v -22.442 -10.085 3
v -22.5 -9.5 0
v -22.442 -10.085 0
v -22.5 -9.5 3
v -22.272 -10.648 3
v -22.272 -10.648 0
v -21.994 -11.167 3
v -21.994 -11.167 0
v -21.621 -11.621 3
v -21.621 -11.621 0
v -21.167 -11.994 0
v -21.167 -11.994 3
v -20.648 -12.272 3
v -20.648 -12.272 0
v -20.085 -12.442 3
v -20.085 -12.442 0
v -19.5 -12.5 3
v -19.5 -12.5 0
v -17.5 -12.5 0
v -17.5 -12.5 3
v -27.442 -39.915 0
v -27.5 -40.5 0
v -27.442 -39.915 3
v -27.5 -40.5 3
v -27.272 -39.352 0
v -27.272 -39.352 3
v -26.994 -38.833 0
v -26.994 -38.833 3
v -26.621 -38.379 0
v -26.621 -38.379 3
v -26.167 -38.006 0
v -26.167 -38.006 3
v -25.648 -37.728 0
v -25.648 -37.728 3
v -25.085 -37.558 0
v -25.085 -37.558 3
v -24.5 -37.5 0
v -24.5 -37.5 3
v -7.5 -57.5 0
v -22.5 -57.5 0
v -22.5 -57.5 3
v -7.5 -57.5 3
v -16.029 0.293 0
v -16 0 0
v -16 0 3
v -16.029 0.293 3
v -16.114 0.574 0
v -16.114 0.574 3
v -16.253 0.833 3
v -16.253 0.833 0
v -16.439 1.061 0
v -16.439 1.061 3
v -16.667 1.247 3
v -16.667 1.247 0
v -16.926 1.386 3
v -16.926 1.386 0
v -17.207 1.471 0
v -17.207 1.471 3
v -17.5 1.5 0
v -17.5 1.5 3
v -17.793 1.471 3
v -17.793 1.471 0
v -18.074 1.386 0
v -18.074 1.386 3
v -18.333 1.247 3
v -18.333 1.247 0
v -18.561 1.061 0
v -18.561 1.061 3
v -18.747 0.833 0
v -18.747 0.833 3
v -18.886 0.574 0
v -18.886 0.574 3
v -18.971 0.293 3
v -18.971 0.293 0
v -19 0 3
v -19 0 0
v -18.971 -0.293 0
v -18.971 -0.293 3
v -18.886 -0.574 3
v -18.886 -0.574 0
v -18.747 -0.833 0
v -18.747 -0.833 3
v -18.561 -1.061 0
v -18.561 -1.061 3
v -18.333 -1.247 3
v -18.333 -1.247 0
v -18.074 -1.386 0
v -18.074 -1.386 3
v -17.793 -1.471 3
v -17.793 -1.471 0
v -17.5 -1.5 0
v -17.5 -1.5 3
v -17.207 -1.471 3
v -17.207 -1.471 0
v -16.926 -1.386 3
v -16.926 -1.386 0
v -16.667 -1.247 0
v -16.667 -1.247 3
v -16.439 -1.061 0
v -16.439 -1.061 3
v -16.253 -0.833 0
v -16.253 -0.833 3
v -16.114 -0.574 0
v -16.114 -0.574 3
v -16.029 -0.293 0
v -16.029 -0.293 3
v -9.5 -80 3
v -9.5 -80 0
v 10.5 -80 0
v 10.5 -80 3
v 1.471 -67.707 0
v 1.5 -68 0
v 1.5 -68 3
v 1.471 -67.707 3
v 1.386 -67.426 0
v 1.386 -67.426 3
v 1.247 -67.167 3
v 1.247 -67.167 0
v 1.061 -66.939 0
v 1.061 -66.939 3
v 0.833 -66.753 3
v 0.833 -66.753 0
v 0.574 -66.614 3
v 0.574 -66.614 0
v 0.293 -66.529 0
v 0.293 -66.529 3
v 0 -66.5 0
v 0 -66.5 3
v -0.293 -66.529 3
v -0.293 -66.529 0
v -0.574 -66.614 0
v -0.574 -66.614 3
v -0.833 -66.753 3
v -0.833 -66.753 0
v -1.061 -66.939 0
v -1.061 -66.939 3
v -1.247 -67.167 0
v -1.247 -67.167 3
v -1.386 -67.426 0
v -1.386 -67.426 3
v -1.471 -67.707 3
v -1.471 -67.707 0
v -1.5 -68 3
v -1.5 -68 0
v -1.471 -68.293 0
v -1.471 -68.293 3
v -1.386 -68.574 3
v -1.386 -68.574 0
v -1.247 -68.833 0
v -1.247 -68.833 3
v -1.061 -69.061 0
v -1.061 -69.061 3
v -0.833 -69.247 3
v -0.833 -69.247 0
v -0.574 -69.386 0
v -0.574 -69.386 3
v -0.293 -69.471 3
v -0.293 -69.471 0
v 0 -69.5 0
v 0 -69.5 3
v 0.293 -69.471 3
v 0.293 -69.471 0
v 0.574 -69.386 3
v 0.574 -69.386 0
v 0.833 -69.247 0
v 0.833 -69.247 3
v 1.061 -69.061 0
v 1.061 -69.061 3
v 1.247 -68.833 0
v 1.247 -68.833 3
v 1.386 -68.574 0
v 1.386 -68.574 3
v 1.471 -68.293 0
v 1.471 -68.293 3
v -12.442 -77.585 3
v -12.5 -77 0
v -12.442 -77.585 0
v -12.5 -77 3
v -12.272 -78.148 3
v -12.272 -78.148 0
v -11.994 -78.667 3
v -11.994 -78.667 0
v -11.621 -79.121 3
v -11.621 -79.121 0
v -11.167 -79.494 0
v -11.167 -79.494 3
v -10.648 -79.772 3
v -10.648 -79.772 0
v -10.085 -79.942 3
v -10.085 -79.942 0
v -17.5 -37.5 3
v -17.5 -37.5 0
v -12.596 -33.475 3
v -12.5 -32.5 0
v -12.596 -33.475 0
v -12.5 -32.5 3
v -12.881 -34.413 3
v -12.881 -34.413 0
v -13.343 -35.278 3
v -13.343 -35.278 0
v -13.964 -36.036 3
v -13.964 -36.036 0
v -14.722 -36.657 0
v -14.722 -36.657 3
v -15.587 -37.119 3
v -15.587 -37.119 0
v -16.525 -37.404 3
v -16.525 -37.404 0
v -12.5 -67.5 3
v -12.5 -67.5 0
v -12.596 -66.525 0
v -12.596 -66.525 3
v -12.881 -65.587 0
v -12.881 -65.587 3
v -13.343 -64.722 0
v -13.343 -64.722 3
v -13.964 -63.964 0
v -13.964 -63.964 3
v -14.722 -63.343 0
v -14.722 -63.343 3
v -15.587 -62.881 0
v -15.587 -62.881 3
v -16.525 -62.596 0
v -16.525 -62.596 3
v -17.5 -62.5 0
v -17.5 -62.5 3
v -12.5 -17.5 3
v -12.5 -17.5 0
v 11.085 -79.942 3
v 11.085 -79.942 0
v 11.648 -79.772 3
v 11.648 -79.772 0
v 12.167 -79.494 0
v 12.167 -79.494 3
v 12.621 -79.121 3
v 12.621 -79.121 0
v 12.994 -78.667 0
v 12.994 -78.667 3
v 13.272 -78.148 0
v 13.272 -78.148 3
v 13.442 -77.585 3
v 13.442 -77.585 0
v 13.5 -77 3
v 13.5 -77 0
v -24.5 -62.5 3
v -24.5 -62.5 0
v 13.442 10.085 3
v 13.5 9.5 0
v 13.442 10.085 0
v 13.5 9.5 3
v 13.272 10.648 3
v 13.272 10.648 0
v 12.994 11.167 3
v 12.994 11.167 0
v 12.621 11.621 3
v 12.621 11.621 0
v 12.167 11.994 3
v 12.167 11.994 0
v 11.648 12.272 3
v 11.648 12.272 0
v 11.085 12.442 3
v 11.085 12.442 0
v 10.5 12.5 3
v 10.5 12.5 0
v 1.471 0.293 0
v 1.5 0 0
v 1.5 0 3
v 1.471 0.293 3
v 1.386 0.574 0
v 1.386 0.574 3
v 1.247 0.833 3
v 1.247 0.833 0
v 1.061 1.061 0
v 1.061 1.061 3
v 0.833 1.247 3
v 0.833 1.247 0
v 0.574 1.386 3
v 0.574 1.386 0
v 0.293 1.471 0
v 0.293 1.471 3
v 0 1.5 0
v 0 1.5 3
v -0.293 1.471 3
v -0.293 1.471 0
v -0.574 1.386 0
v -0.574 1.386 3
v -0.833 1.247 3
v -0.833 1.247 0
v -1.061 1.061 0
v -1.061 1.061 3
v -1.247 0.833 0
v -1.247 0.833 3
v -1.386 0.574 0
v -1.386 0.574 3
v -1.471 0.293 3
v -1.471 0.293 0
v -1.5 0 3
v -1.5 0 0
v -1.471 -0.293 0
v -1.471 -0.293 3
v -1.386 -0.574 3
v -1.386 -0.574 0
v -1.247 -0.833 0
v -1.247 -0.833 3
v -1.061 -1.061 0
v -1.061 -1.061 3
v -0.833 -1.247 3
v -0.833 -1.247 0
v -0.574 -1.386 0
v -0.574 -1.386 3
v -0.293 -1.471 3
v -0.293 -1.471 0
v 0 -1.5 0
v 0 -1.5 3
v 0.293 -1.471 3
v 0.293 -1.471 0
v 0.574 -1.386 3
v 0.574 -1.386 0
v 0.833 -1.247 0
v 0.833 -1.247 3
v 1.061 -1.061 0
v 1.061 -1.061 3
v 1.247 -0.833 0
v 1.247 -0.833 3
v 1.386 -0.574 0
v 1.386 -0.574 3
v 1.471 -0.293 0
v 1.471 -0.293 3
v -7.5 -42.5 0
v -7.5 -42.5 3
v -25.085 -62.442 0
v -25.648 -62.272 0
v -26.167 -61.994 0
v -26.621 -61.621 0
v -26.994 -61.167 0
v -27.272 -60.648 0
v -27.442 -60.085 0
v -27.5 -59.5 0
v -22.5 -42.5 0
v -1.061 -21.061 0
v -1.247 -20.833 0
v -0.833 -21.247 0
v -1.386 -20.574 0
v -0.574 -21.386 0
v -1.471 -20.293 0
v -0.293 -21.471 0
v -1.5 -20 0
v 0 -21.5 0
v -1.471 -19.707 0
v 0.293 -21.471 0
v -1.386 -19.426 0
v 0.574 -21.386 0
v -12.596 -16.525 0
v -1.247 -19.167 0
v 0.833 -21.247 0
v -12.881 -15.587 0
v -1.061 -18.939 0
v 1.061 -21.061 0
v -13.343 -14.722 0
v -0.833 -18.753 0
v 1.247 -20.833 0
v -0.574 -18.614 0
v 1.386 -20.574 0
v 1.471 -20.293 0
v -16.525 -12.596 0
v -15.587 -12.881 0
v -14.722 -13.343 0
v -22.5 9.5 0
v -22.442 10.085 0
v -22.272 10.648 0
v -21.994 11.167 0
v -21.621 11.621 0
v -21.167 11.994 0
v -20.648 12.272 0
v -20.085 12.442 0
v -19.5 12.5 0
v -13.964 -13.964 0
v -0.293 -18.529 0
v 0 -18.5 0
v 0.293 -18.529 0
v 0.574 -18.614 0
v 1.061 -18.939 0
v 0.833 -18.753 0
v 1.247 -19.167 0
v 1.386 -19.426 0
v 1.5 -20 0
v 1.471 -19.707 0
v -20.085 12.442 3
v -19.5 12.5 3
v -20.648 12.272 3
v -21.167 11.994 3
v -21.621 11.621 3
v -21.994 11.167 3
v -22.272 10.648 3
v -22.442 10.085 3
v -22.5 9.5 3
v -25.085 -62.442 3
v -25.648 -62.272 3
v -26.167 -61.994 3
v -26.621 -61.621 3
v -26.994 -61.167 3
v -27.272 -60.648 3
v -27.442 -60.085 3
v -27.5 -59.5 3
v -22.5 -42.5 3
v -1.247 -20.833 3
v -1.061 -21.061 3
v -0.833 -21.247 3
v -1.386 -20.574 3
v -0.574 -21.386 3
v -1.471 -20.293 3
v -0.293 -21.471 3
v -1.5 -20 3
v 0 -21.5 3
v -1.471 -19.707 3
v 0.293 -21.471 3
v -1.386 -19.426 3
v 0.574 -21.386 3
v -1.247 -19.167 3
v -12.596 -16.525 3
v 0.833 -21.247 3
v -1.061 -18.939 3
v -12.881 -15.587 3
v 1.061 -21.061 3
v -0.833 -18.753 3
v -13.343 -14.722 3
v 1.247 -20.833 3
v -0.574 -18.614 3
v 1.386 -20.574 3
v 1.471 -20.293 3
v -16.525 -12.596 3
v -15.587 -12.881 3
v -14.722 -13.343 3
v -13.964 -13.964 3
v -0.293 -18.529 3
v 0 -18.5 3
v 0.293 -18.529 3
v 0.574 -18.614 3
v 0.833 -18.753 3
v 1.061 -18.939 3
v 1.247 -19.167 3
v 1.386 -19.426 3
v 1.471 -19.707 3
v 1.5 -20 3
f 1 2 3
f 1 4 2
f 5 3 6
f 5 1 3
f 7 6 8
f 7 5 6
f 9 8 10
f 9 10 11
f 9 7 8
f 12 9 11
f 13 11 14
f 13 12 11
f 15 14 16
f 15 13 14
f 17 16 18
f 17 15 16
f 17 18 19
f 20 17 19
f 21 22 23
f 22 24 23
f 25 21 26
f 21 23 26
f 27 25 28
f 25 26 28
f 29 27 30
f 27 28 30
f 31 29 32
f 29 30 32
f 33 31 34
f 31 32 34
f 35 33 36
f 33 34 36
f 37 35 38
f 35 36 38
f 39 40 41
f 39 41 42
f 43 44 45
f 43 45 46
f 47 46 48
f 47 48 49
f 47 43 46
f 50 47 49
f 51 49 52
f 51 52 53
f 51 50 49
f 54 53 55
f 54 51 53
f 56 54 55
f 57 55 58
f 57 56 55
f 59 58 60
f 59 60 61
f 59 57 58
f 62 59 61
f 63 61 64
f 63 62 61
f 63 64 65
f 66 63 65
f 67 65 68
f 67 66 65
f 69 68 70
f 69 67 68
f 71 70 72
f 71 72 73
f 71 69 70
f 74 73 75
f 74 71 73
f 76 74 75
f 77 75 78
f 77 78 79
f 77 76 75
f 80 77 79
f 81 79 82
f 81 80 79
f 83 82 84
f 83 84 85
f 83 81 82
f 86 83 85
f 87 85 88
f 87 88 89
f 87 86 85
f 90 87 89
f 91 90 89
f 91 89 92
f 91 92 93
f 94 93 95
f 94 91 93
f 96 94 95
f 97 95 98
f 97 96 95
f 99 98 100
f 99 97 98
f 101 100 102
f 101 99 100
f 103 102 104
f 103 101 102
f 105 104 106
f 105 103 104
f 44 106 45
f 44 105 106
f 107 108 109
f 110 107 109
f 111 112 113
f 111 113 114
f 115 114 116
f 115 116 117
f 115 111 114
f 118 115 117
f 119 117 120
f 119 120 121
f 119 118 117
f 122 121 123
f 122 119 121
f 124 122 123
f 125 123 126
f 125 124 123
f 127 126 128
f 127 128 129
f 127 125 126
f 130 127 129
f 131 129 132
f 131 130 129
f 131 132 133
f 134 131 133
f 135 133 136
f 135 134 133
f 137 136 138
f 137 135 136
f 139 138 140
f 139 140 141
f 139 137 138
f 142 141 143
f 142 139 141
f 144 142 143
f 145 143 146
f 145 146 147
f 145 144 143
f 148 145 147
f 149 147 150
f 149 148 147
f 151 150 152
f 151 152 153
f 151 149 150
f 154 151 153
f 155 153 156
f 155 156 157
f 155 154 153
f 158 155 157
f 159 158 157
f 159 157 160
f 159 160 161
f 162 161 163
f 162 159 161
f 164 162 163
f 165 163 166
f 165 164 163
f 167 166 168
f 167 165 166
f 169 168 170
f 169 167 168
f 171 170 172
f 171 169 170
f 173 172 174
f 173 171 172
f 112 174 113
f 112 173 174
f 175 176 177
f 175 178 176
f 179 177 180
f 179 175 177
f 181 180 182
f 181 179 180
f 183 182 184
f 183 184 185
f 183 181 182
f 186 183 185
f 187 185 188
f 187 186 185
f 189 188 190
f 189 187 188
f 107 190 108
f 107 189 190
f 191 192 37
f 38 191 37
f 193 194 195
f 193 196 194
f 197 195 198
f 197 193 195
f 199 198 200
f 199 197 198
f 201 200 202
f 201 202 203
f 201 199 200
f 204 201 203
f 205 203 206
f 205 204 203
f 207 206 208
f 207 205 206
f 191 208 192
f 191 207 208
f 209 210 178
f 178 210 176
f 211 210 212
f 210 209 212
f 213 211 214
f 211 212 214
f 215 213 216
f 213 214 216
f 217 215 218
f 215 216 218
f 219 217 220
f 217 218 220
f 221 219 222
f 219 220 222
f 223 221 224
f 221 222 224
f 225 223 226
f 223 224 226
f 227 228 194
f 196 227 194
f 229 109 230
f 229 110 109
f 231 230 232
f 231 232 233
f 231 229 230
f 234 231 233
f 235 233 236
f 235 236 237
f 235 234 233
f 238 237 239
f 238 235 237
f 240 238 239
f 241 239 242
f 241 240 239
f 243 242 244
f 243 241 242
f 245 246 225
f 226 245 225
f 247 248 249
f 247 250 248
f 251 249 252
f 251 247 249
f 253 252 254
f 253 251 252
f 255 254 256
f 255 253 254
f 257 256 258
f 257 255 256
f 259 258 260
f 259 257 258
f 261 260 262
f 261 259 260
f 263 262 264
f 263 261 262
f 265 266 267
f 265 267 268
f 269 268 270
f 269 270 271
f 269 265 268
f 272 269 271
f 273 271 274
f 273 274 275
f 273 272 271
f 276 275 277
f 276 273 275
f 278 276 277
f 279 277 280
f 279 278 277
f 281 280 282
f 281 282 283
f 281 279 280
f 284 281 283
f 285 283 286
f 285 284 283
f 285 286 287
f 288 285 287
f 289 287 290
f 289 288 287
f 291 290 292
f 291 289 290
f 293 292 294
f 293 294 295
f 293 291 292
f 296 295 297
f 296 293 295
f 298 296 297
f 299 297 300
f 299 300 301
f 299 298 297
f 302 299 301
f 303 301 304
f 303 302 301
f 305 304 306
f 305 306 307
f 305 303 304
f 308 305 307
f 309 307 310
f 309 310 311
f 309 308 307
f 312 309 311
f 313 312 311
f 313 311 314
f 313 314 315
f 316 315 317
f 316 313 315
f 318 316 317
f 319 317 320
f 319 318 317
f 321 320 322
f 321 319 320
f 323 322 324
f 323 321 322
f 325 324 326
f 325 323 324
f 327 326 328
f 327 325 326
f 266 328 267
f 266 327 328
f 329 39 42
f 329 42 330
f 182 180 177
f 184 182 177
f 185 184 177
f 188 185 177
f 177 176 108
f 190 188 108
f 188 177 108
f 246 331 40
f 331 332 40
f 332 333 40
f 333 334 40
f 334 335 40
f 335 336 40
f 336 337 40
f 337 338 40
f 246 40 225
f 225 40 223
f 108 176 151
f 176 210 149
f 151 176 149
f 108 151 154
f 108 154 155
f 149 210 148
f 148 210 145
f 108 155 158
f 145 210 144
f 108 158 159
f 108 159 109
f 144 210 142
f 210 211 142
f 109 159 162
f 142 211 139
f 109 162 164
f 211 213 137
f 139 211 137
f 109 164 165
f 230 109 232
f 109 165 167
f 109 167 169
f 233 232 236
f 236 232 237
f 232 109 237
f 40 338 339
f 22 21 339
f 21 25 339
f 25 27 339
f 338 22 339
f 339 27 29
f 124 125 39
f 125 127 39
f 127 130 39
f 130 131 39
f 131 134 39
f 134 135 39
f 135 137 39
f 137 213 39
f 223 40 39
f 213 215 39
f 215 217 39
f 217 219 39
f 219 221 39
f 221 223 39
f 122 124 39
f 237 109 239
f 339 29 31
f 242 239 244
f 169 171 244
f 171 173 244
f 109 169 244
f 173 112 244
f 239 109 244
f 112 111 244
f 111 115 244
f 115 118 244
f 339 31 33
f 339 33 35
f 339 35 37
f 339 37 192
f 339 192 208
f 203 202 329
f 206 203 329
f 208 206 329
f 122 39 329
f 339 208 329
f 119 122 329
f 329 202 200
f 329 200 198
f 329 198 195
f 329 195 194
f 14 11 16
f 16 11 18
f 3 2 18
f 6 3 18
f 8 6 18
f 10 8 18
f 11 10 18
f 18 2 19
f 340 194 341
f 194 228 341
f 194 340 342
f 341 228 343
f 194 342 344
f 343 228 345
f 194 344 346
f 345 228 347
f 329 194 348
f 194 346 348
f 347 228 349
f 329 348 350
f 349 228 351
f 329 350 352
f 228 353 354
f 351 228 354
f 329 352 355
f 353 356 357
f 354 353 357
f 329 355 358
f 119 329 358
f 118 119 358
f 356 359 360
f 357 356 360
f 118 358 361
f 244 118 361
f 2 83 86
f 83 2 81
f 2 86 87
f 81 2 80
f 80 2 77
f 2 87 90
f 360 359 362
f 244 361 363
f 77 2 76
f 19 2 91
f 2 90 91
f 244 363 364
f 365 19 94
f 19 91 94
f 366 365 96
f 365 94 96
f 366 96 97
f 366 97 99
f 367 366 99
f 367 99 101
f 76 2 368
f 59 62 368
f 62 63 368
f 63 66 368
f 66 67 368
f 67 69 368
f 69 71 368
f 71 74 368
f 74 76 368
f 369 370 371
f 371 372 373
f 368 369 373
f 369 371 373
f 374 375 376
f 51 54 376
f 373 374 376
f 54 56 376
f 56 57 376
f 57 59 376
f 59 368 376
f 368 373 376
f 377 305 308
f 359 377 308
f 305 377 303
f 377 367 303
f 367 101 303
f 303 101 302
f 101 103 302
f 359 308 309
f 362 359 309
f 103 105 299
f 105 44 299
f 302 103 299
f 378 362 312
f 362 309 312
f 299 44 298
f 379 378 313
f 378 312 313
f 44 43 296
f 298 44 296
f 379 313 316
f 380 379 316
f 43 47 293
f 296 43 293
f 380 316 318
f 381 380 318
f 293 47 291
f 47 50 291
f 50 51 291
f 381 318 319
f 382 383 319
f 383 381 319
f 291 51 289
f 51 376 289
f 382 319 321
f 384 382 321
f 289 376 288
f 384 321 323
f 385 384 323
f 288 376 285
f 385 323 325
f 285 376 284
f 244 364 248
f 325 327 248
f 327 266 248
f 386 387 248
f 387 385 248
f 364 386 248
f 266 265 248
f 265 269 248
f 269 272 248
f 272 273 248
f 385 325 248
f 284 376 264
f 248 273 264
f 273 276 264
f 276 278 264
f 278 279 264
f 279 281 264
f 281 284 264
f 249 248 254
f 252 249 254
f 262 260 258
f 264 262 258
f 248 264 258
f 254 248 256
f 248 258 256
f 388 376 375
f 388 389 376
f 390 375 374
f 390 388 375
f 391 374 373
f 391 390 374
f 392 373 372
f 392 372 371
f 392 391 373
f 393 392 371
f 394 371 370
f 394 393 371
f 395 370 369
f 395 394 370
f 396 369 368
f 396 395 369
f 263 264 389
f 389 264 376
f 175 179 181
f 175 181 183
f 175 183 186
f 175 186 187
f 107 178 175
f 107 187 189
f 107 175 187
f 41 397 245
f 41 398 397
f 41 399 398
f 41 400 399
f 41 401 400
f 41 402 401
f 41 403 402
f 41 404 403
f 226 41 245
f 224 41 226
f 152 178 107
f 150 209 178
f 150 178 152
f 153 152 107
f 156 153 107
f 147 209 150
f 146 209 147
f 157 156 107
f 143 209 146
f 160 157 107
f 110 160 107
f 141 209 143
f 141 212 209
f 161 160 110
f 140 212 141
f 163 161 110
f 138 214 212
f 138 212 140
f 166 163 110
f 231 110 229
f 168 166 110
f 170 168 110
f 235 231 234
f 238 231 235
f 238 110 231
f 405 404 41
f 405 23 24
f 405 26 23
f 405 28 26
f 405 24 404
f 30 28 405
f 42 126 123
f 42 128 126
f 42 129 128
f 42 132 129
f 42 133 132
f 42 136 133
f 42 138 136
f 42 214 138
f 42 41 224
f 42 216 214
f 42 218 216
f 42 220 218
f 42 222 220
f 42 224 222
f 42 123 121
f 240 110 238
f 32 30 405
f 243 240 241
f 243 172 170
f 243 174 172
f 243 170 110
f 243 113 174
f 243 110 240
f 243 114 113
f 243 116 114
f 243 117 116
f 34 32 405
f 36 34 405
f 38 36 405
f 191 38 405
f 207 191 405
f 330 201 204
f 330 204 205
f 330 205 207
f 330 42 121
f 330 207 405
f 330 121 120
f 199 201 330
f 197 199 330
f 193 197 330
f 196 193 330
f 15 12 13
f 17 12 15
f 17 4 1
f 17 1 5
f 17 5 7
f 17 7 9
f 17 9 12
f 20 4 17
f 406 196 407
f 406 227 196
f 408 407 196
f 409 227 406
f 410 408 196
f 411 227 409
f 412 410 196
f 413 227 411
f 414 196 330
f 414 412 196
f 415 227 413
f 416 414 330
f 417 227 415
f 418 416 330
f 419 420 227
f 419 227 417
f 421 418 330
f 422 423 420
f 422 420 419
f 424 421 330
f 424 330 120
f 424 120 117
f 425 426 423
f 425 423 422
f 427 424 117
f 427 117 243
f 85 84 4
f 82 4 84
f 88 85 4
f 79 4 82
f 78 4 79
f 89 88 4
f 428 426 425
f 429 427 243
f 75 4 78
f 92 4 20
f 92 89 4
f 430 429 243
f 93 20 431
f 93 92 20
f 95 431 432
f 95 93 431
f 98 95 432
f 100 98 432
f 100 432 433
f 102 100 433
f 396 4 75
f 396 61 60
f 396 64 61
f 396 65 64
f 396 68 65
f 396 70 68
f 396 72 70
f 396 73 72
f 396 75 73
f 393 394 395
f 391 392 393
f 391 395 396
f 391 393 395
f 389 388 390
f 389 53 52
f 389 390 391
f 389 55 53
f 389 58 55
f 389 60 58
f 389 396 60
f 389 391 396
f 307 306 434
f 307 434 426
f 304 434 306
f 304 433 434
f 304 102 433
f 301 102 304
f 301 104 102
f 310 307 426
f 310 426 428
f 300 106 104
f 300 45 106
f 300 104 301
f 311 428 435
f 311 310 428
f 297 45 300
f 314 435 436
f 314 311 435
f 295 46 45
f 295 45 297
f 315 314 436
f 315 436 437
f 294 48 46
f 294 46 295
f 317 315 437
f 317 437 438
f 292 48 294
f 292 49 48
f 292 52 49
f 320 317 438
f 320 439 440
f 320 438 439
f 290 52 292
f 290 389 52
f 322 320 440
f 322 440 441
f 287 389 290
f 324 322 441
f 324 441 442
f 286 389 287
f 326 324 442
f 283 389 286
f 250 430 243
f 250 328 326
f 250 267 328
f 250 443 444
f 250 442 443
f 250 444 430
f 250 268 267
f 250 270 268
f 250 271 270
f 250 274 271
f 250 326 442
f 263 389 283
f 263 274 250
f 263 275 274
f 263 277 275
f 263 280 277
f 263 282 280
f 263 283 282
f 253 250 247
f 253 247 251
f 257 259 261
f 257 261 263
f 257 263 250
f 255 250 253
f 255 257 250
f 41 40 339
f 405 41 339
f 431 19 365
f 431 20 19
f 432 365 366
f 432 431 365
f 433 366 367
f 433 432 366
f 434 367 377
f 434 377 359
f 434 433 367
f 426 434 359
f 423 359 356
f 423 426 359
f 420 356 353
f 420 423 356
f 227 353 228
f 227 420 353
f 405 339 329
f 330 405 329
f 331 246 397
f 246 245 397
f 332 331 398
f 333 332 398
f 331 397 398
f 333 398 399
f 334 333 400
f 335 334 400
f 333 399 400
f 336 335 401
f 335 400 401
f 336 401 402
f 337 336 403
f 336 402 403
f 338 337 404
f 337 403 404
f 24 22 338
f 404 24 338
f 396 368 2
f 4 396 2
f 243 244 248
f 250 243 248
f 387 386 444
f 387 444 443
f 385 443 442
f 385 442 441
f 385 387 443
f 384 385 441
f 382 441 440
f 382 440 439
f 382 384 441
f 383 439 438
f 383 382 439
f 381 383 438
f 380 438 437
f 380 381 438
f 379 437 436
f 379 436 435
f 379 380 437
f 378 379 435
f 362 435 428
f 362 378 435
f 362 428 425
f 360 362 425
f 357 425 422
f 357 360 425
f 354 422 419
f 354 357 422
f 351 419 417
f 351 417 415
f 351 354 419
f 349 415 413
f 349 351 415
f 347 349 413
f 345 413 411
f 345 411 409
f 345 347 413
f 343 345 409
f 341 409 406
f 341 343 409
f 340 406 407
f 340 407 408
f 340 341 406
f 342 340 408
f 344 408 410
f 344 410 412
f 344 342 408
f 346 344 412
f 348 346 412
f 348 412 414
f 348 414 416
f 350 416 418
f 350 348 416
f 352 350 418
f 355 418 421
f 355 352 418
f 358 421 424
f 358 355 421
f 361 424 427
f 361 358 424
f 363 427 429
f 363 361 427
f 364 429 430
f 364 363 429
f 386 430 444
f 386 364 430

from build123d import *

# Parameters (mm, degrees)
SKETCH_1_R      = 1.5
SKETCH_1_W      = 15
SKETCH_1_H      = 15
EXTRUDE_1_DEPTH = 3
FILLET_1_R      = 5
FILLET_2_R      = 3


with BuildPart() as part:
    # 草图1 → 凸台-拉伸1 (new body)
    with BuildSketch(Plane.XY):
        Polygon((13.5, -80), (13.5, 12.5), (-22.5, 12.5), (-22.5, -12.5), (-12.5, -12.5), (-12.5, -37.5), (-27.5, -37.5), (-27.5, -62.5), (-12.5, -62.5), (-12.5, -80), align=None)
        Circle(SKETCH_1_R, mode=Mode.SUBTRACT)
        with Locations((0, -20)):
            Circle(SKETCH_1_R, mode=Mode.SUBTRACT)
        with Locations((0, -68)):
            Circle(SKETCH_1_R, mode=Mode.SUBTRACT)
        with Locations((-17.5, 0)):
            Circle(SKETCH_1_R, mode=Mode.SUBTRACT)
        with Locations((-15, -50)):
            Rectangle(SKETCH_1_W, SKETCH_1_H, mode=Mode.SUBTRACT)
    extrude(amount=EXTRUDE_1_DEPTH)

    # 圆角1
    fillet_1_edges = [part.edges().sort_by_distance(p)[0] for p in [
        (-12.5, -62.5, 1.5),
        (-12.5, -37.5, 1.5),
        (-12.5, -12.5, 1.5),
    ]]
    fillet(fillet_1_edges, radius=FILLET_1_R)

    # 圆角2
    fillet_2_edges = [part.edges().sort_by_distance(p)[0] for p in [
        (13.5, 12.5, 1.5),
        (13.5, -80, 1.5),
        (-12.5, -80, 1.5),
        (-27.5, -62.5, 1.5),
        (-27.5, -37.5, 1.5),
        (-22.5, -12.5, 1.5),
        (-22.5, 12.5, 1.5),
    ]]
    fillet(fillet_2_edges, radius=FILLET_2_R)


solid = part.part
